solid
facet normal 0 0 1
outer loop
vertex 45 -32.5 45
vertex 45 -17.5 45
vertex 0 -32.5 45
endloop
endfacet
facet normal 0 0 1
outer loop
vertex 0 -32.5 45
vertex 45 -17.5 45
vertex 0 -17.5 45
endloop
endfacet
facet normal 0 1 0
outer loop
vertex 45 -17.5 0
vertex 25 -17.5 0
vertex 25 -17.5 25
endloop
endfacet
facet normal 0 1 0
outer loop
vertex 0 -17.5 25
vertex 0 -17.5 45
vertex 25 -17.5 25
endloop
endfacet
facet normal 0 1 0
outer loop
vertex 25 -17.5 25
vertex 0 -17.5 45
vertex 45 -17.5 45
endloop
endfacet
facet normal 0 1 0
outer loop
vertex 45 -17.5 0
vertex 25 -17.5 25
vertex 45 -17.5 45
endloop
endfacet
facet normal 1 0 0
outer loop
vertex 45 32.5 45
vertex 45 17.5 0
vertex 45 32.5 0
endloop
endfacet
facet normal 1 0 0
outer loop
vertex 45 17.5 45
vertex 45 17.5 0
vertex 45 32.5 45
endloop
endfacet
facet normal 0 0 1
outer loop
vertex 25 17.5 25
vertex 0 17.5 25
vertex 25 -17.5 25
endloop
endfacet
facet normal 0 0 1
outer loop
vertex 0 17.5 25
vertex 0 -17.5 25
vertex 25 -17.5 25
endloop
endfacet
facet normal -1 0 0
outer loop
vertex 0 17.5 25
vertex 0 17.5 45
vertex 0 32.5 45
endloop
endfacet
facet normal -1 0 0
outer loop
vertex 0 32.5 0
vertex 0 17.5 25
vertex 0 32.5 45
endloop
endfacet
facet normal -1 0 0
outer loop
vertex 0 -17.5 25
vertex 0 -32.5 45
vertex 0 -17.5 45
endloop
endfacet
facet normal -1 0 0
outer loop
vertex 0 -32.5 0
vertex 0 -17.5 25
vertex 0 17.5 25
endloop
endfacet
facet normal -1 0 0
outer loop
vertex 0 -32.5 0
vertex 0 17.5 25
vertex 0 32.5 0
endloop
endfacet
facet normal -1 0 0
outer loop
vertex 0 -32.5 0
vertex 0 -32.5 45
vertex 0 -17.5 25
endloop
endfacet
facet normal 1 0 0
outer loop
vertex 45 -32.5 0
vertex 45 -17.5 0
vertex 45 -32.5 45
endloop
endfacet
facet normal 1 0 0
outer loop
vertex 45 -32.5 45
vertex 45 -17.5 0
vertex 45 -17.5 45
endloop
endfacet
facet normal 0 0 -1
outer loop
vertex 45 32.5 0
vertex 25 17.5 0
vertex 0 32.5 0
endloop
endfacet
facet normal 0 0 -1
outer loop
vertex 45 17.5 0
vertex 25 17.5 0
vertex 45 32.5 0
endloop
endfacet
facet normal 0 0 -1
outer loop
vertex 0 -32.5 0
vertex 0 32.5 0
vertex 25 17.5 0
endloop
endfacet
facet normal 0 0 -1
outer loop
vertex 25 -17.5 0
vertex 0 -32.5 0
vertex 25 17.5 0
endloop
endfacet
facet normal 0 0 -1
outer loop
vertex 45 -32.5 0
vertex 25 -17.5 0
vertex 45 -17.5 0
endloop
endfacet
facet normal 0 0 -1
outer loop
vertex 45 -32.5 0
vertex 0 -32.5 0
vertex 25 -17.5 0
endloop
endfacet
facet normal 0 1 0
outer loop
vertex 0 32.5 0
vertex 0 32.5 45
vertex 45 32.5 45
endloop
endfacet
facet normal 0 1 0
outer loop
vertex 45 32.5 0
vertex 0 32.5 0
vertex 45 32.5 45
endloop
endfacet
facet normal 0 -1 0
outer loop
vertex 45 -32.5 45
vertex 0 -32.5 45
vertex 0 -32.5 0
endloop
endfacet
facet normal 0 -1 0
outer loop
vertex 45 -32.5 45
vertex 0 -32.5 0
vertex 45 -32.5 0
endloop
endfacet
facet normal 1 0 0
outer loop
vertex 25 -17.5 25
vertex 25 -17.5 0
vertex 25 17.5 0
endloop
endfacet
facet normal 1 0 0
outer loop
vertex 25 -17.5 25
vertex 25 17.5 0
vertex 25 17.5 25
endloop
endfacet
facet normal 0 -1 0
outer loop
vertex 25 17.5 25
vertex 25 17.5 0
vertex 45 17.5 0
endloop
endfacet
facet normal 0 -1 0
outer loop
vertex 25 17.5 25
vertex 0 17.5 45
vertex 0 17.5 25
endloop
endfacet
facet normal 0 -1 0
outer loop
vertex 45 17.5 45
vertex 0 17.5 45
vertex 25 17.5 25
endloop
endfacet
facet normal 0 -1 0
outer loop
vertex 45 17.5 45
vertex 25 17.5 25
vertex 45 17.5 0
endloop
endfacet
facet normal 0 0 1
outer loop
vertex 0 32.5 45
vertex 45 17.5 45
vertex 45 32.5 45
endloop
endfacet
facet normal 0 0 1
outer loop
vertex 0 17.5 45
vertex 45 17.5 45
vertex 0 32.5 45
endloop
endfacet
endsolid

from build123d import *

# Parameters (mm, degrees)
F0_W     = 25
F0_H     = 25
F1_DEPTH = 17.5
F2_W     = 25
F2_H     = 25
F3_DEPTH = 15


with BuildPart() as f1:
    # F0 (on Front) → F1 (new body)
    with BuildSketch(Plane.XZ):
        with Locations((12.5, 12.5)):
            Rectangle(F0_W, F0_H)
    extrude(amount=F1_DEPTH)

    # F2 (on face) → F3 (join)
    with BuildSketch(Plane.XZ.offset(17.5)):
        Polygon((25, 25), (25, 0), (45, 0), (45, 45), (0, 45), (0, 25), align=None)
        with Locations((12.5, 12.5)):
            Rectangle(F2_W, F2_H)
    extrude(amount=F3_DEPTH)

    # F4: F1 across face


with BuildPart() as f1_1:
    add(f1.part)
    add(f1.part.mirror(Plane(origin=(12.5, 0, 12.5), x_dir=(1, 0, 0), z_dir=(0, 1, 0))))


solid = f1_1.part
